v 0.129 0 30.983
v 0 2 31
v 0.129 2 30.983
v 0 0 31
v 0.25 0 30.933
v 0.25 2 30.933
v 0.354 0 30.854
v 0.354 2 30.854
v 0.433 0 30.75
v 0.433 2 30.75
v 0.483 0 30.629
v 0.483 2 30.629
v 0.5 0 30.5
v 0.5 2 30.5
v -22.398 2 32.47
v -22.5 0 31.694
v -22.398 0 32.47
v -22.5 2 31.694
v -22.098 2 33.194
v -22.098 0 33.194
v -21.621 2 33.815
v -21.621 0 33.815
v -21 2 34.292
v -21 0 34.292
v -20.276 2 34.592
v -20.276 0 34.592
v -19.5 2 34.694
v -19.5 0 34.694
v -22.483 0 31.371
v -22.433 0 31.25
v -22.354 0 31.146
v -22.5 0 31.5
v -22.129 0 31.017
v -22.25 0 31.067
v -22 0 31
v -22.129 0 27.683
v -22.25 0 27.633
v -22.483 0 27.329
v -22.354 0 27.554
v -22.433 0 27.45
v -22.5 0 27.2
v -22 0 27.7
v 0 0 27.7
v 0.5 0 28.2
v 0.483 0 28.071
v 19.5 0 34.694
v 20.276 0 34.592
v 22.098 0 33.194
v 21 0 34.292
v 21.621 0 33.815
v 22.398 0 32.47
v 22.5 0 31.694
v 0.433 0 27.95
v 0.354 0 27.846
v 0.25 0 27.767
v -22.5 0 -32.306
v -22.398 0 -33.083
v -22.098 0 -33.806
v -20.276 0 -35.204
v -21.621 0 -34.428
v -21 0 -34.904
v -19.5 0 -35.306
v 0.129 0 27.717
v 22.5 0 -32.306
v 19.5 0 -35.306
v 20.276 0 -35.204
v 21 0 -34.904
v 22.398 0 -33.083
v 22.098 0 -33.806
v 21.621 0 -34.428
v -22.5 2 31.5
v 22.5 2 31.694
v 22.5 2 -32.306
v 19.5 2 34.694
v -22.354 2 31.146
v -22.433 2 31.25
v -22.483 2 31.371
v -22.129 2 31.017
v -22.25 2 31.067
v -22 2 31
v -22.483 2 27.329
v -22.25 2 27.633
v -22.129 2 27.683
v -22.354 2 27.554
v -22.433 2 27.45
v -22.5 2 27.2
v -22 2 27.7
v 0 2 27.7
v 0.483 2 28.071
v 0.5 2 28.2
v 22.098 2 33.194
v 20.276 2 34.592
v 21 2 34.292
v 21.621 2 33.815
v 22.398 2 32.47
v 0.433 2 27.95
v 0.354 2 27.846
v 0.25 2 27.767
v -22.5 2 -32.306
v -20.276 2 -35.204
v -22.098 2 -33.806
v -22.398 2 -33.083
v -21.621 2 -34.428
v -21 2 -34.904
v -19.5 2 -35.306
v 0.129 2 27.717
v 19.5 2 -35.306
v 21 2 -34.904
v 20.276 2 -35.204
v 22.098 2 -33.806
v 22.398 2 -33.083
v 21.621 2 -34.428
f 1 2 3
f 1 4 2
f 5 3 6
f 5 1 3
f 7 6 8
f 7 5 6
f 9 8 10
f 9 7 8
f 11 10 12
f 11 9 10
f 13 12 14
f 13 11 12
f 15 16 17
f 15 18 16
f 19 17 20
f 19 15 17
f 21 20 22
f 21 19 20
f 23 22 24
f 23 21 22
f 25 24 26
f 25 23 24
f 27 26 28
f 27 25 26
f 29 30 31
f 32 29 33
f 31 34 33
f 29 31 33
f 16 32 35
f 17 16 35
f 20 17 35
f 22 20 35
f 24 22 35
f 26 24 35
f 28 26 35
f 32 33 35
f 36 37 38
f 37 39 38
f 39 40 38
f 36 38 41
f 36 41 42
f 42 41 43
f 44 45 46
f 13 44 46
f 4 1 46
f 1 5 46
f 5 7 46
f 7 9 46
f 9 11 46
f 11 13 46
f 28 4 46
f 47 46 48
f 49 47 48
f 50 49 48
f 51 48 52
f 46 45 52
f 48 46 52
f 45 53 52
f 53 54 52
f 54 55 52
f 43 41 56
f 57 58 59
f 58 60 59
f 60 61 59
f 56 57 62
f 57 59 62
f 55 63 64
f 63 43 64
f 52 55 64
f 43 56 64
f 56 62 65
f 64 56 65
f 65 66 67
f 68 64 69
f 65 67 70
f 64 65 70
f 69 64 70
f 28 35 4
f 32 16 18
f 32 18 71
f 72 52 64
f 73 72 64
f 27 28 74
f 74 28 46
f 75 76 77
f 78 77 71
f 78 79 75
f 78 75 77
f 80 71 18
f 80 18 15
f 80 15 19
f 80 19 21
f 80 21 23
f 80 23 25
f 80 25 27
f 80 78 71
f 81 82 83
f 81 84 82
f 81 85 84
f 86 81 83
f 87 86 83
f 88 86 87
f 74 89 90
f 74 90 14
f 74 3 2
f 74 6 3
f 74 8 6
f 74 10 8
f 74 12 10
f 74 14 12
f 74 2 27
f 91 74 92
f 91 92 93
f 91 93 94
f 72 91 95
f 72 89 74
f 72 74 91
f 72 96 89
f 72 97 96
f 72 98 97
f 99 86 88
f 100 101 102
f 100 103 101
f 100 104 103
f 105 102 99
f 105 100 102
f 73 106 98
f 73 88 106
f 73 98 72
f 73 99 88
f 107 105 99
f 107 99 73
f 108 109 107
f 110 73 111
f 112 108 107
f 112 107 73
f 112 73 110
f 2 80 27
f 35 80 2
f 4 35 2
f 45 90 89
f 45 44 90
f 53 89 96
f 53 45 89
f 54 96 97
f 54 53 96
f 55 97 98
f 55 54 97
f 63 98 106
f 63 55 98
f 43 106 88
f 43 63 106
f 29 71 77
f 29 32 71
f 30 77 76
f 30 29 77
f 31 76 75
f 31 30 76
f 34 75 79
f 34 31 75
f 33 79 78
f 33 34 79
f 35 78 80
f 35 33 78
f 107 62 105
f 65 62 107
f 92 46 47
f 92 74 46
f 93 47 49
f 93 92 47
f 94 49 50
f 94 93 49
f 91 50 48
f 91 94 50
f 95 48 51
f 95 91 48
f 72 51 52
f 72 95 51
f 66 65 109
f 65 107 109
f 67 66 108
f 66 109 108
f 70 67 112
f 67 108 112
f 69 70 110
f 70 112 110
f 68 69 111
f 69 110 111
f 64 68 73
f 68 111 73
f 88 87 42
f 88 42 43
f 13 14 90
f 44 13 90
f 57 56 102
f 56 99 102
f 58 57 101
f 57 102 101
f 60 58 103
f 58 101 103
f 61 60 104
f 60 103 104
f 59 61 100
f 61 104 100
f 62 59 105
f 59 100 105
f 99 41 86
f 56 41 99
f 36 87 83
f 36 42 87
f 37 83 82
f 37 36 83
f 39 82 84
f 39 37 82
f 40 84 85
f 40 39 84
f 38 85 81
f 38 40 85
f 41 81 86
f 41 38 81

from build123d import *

# Parameters (mm, degrees)
CROQUIS1_W              = 45
CROQUIS1_H              = 70
SALIENTE_EXTRUIR1_DEPTH = 2
CROQUIS2_W              = 23
CROQUIS2_H              = 3.3
CORTAR_EXTRUIR1_DEPTH   = 2
REDONDEO1_R             = 3
REDONDEO2_R             = 0.5


with BuildPart() as part:
    # Croquis1 → Saliente-Extruir1 (new body)
    with BuildSketch(Plane(origin=(0, 0, 0), x_dir=(1, 0, 0), z_dir=(0, 1, 0))):
        with Locations((0, 0.306231574)):
            Rectangle(CROQUIS1_W, CROQUIS1_H)
    extrude(amount=SALIENTE_EXTRUIR1_DEPTH)

    # Croquis2 → Cortar-Extruir1 (cut)
    with BuildSketch(Plane(origin=(0, 2, 0), x_dir=(1, 0, 0), z_dir=(0, 1, 0))):
        with Locations((-11, -29.35)):
            Rectangle(CROQUIS2_W, CROQUIS2_H)
    extrude(amount=-CORTAR_EXTRUIR1_DEPTH, mode=Mode.SUBTRACT)

    # Redondeo1
    redondeo1_edges = [part.edges().sort_by_distance(p)[0] for p in [
        (-22.5, 1, -35.306231574),
        (22.5, 1, -35.306231574),
        (22.5, 1, 34.693768426),
        (-22.5, 1, 34.693768426),
    ]]
    fillet(redondeo1_edges, radius=REDONDEO1_R)

    # Redondeo2
    redondeo2_edges = [part.edges().sort_by_distance(p)[0] for p in [
        (-22.5, 1, 31),
        (-22.5, 1, 27.7),
        (0.5, 1, 27.7),
        (0.5, 1, 31),
    ]]
    fillet(redondeo2_edges, radius=REDONDEO2_R)


solid = part.part
